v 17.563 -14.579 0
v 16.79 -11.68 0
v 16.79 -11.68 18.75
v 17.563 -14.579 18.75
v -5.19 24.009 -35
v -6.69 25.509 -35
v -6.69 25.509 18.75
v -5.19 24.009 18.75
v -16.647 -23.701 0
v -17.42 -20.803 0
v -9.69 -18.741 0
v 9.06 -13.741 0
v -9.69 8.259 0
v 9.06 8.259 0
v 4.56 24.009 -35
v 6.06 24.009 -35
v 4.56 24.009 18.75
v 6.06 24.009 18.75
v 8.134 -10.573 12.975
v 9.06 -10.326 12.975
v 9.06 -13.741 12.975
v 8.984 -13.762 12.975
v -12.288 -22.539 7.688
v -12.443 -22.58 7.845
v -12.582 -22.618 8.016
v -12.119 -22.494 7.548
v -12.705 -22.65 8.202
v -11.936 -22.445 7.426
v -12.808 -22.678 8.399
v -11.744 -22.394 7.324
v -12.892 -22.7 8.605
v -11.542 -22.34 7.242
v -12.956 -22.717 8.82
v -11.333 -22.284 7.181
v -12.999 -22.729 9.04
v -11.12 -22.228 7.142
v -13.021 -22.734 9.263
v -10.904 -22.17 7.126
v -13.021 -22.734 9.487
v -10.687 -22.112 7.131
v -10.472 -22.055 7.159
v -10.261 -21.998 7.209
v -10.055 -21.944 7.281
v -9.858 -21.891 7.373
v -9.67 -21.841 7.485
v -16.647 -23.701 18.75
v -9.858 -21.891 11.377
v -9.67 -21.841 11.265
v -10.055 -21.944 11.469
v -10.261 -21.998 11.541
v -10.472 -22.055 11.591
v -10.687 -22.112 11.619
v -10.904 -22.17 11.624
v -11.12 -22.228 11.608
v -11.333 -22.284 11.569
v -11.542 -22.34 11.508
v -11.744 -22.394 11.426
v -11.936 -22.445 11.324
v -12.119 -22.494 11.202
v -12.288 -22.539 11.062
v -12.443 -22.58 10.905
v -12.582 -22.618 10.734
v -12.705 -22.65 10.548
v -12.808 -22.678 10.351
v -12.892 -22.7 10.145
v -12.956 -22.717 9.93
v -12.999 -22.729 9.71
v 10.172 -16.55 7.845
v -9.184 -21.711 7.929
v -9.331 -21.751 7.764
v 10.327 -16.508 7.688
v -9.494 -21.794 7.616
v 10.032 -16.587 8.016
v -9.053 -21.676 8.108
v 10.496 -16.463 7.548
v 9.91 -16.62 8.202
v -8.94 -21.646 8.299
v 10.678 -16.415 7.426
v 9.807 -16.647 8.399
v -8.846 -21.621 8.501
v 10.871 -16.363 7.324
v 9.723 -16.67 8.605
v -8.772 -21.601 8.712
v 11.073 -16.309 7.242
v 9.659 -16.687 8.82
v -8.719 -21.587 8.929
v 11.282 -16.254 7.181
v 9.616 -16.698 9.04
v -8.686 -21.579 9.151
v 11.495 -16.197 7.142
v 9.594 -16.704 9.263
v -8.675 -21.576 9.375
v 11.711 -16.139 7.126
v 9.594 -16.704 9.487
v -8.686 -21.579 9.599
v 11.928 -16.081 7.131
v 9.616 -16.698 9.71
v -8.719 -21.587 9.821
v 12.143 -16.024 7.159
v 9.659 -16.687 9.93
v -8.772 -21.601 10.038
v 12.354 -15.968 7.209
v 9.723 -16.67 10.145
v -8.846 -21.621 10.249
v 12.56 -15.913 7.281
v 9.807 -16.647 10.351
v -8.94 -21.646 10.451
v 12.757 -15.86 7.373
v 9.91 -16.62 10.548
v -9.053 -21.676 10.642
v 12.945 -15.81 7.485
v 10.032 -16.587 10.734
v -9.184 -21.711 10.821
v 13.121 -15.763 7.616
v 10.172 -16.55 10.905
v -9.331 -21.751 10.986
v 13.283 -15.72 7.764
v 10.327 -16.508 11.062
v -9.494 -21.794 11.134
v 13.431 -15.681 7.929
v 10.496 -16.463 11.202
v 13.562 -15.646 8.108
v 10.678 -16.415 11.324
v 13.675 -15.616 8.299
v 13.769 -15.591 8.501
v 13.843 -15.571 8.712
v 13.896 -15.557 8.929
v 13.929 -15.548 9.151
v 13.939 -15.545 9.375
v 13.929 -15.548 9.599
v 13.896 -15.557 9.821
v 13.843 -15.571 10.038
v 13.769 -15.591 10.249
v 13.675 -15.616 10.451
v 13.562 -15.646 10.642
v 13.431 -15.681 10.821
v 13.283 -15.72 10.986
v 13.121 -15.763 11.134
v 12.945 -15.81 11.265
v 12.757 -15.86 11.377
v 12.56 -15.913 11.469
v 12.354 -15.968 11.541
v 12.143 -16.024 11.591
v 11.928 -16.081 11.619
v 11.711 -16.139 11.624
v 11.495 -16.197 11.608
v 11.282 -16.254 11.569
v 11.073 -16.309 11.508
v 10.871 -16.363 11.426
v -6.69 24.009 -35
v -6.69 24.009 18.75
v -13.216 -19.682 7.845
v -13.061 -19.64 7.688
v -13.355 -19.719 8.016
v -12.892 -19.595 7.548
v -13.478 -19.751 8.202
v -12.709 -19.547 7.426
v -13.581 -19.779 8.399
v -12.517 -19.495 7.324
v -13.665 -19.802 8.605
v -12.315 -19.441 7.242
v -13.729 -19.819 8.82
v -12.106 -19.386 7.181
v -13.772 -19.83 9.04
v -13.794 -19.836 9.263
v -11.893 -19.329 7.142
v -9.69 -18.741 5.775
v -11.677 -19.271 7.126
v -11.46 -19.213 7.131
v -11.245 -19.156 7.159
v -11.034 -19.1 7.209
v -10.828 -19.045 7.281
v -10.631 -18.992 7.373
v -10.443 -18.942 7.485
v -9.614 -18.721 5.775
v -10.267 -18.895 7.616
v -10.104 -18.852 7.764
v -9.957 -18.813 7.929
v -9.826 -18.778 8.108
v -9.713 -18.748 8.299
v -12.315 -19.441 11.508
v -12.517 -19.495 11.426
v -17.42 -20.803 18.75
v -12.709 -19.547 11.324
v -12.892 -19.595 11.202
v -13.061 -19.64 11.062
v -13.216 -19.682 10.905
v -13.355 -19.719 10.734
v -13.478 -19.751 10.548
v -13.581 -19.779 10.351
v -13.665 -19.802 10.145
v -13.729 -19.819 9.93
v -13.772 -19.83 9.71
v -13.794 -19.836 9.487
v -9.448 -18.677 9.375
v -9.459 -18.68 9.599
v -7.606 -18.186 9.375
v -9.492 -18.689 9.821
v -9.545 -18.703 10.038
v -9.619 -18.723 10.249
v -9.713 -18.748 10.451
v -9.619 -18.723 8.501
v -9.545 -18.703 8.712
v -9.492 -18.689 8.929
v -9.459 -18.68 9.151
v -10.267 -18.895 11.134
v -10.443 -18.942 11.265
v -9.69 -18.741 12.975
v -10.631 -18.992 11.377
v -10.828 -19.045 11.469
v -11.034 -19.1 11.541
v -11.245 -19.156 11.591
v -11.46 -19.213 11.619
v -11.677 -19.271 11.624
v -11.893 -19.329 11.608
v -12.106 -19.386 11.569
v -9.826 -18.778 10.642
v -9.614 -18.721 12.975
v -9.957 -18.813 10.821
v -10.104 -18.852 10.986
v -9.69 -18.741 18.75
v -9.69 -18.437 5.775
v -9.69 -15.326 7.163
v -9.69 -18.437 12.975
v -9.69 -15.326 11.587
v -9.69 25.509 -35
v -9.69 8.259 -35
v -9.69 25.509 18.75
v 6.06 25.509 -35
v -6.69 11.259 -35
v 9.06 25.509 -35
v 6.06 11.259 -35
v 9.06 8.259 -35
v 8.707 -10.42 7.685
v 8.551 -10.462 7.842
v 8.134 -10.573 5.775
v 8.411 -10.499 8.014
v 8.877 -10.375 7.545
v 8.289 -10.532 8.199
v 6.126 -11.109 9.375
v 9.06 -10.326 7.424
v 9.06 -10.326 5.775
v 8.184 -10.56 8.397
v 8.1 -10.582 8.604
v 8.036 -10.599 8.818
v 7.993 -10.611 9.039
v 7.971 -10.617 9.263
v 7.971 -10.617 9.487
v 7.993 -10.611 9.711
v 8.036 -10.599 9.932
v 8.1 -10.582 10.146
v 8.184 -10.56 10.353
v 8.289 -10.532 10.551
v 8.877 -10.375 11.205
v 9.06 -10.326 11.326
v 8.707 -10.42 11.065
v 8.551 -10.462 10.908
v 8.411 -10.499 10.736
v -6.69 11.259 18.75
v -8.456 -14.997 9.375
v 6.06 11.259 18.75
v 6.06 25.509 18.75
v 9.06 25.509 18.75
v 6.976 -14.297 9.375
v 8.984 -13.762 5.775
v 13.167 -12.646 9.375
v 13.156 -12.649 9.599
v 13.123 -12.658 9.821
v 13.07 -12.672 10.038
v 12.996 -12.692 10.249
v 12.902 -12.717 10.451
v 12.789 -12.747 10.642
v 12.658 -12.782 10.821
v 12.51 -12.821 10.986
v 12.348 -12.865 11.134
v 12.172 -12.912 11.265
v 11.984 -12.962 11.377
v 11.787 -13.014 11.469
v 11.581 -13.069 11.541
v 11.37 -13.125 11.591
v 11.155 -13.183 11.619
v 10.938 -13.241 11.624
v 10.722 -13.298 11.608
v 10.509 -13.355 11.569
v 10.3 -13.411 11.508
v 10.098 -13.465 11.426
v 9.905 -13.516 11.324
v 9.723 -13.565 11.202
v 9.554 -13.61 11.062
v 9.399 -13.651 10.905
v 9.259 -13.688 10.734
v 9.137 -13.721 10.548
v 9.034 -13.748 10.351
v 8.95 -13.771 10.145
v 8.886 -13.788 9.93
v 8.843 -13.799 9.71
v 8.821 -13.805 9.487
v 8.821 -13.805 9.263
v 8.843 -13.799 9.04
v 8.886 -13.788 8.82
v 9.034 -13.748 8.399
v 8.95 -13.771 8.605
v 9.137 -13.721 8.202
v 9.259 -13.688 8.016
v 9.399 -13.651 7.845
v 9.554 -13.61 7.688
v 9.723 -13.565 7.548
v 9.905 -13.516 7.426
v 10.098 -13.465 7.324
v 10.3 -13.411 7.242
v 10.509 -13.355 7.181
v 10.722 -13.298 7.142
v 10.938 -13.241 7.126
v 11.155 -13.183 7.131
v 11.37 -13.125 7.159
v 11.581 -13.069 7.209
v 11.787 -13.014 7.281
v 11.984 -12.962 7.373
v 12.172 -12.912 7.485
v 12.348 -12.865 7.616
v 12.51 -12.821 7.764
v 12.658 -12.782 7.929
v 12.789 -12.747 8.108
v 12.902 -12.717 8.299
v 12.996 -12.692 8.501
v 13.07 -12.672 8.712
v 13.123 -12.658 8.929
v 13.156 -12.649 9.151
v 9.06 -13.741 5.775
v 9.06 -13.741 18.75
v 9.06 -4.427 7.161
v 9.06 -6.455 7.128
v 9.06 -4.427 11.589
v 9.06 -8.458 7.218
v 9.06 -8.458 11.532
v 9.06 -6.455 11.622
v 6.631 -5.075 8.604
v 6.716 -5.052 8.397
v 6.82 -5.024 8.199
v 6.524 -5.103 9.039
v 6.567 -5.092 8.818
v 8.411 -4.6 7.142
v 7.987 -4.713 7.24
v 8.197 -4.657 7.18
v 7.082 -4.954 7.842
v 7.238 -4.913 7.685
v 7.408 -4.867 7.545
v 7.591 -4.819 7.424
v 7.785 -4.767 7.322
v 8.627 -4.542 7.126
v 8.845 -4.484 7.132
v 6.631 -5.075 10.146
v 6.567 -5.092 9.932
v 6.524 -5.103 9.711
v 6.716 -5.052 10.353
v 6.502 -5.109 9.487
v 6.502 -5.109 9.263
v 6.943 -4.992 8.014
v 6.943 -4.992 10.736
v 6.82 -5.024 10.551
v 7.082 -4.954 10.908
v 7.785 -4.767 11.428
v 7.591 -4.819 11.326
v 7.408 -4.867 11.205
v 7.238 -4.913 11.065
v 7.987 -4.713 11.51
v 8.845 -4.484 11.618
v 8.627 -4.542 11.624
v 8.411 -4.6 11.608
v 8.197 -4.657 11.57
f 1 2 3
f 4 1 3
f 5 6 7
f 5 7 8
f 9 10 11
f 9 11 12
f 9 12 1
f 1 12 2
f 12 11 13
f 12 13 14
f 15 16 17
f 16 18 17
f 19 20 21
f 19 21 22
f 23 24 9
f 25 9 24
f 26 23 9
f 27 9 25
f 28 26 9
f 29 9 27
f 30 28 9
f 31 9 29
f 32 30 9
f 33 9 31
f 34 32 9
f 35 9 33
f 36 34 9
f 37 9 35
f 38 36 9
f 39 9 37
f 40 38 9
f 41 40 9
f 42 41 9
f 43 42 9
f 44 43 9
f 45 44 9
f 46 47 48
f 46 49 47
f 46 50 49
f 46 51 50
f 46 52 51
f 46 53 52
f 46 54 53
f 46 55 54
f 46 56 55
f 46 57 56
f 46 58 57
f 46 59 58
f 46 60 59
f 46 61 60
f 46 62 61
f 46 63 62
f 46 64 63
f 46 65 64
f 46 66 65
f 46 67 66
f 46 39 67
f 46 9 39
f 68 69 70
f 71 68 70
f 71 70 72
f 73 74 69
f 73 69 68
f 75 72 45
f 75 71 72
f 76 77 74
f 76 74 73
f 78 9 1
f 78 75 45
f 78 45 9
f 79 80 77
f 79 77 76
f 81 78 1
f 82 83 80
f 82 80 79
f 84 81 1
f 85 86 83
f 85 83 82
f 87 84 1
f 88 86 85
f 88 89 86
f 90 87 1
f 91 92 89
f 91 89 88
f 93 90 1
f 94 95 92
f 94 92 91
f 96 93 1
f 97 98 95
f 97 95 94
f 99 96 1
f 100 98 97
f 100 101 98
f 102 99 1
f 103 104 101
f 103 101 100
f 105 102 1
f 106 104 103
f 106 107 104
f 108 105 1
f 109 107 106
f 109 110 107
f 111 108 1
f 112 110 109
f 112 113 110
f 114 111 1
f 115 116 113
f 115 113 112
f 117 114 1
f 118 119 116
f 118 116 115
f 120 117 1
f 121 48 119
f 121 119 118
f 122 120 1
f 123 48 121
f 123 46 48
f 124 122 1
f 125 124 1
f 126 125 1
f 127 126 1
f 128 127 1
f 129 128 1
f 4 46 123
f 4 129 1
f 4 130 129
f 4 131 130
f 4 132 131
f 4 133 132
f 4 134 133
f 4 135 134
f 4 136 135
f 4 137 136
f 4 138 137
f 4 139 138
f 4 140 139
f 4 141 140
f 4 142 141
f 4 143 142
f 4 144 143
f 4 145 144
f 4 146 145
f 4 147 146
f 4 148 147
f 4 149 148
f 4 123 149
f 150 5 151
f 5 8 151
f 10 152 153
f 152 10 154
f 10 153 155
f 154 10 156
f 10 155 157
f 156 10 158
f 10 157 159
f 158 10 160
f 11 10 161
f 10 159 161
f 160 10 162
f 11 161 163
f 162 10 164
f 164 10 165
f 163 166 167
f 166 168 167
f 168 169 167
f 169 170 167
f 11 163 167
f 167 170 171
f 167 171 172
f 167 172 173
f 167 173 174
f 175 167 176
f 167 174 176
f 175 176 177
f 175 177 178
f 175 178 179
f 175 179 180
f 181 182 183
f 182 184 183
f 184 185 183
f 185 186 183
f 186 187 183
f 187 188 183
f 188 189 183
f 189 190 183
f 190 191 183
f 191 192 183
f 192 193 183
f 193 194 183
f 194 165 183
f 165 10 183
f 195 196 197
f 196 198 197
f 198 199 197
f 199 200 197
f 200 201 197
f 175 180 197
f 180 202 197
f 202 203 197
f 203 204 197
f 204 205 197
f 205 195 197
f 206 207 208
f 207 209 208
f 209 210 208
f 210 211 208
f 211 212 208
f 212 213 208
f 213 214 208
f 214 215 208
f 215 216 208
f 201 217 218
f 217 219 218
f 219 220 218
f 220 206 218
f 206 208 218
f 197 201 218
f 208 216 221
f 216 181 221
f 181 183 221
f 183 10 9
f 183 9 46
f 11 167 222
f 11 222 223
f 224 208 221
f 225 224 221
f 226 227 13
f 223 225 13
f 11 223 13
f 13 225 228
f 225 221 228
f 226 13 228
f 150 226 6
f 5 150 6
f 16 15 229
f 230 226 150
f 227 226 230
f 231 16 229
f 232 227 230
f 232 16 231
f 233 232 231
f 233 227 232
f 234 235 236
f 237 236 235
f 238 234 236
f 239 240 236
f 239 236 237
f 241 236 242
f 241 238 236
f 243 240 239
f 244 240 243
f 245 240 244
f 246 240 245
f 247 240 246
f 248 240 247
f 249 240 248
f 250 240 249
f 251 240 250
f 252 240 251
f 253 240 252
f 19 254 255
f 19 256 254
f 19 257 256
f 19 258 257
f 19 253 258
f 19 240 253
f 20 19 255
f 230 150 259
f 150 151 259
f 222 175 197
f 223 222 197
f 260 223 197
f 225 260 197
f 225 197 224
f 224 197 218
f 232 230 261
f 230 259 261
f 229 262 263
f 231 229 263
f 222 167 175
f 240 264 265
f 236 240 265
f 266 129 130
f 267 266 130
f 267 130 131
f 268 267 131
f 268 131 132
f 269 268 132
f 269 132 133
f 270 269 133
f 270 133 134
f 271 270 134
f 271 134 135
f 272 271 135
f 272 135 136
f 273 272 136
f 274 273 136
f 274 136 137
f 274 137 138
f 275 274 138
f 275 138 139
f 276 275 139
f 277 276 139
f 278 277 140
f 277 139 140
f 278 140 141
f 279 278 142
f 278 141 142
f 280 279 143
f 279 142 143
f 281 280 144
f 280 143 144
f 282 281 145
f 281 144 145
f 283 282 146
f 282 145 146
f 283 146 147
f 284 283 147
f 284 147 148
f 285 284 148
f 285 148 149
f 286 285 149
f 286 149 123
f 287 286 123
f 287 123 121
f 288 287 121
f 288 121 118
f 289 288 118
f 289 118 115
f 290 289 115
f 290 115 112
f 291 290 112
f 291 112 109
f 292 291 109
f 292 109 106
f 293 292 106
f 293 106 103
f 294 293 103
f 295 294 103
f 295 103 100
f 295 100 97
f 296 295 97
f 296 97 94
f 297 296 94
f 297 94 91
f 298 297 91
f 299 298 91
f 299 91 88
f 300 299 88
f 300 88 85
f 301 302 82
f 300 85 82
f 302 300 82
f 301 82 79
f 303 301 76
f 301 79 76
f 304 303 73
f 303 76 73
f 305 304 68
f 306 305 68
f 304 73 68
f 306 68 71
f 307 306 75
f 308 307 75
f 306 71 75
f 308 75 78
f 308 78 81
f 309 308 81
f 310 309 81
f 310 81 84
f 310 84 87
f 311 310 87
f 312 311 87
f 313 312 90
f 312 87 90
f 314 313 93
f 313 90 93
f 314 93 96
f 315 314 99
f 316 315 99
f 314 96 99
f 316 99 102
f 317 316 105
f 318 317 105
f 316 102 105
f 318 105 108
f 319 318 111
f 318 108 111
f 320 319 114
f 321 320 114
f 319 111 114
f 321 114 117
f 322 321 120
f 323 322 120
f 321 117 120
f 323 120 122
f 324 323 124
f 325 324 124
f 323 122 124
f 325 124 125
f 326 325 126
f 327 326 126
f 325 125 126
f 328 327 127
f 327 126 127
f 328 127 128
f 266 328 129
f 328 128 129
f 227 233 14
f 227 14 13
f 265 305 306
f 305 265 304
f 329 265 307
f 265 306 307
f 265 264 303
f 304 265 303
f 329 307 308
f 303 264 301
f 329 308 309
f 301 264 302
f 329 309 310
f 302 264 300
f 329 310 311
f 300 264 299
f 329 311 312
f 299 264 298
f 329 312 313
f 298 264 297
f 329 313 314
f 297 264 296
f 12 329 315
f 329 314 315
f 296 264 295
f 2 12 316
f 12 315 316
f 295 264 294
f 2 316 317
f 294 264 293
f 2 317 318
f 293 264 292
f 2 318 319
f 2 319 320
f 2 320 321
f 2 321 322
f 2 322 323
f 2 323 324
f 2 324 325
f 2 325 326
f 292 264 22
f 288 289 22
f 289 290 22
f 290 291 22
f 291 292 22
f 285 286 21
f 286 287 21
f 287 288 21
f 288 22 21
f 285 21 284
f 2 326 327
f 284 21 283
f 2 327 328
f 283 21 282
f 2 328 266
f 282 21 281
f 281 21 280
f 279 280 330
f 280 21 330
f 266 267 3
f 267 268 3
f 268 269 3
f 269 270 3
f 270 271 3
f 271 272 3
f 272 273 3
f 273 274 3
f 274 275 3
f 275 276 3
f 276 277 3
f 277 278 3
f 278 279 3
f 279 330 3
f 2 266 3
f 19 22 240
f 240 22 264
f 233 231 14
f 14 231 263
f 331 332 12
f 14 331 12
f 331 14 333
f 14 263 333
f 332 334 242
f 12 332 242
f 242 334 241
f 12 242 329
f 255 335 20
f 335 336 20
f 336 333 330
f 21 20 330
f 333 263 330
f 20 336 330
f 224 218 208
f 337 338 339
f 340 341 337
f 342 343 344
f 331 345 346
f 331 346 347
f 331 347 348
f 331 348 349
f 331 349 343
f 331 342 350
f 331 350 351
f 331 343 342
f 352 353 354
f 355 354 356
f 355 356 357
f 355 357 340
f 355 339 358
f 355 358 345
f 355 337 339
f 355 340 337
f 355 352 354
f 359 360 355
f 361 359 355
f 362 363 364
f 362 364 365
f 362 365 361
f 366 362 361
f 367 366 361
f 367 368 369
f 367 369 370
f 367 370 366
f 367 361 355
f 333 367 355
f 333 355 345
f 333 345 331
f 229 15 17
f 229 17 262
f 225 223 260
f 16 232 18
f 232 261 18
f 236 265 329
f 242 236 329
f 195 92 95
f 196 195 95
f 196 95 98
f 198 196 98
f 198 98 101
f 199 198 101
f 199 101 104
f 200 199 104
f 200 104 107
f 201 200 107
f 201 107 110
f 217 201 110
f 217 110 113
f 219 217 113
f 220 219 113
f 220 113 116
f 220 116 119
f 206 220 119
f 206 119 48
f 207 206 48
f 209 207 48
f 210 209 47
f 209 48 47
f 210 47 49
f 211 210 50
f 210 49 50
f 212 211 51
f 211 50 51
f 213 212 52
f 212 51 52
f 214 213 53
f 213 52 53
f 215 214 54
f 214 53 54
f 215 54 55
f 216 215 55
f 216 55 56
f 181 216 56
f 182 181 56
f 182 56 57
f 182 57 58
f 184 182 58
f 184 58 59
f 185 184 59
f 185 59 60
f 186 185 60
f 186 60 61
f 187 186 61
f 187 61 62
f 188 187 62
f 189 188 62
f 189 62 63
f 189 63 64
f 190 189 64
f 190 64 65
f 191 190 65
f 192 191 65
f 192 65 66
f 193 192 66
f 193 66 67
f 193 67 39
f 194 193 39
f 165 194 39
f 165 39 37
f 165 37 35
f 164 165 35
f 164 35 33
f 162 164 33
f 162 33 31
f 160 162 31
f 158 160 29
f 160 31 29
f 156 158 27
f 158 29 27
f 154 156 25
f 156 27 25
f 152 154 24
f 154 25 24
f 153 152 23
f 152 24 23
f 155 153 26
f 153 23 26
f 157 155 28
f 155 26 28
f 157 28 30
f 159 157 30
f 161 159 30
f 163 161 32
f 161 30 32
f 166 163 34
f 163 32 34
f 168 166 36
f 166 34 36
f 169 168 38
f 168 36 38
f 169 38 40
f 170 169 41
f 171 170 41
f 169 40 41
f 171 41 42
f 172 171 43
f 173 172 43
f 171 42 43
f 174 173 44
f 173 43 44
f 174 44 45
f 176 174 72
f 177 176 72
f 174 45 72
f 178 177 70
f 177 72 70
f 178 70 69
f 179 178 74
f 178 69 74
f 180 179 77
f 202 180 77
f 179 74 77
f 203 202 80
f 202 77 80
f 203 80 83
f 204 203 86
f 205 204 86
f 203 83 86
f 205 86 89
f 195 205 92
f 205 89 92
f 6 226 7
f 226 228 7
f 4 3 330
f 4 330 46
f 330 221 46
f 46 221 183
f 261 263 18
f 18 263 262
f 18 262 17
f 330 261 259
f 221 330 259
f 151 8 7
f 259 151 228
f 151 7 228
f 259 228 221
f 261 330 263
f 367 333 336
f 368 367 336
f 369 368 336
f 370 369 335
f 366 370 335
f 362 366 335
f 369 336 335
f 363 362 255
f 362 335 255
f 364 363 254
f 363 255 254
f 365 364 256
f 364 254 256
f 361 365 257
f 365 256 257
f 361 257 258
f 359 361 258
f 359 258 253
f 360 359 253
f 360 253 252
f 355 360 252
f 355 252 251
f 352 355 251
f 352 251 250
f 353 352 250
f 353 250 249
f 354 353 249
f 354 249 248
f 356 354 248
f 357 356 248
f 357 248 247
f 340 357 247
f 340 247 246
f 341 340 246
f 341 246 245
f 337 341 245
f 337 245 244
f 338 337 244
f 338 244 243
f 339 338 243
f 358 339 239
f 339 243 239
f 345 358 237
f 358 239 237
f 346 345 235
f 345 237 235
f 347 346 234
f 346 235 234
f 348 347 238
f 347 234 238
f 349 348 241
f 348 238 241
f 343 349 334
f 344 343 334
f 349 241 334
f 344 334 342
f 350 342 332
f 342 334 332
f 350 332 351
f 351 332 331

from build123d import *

# Parameters (mm, degrees)
F3_DEPTH  = 18.75
F4_W      = 19.4052183703
F4_H      = 18.75
F4_W_2    = 8
F5_DEPTH  = 3
F6_R      = 2.25
F7_DEPTH  = 12
F9_DEPTH  = 3.3
F11_DEPTH = 35


with BuildPart() as f3:
    # F2 (on Top) → F3 (new body)
    with BuildSketch(Plane.XY):
        Polygon((-6.6899931507, 11.2585633857), (-6.6899931507, 24.0085633857), (-5.1899931507, 24.0085633857), (-6.6899931507, 25.5085633857), (-9.6899931507, 25.5085633857), (-9.6899931507, 24.0085633857), (-9.6899931507, 11.2585633857), (-9.6899931507, -18.7414366143), (9.0600068493, -13.7414366143), (9.0600068493, 11.2585633857), (9.0600068493, 24.0085633857), (9.0600068493, 25.5085633857), (6.0600068493, 25.5085633857), (4.5600068493, 24.0085633857), (6.0600068493, 24.0085633857), (6.0600068493, 11.2585633857), align=None)
    extrude(amount=F3_DEPTH)

    # F4 (on face) → F5 (join)
    with BuildSketch(Plane(origin=(4.0225987819, -15.0847454323, 0), x_dir=(0.9662349396, 0.2576626506, 0), z_dir=(0.2576626506, -0.9662349396, 0))):
        with Locations((-4.4891689949, 9.375)):
            Rectangle(F4_W, F4_H)
        with Locations((-18.1917781801, 9.375)):
            Rectangle(F4_W_2, F4_H)
        with Locations((9.2134401902, 9.375)):
            Rectangle(F4_W_2, F4_H)
    extrude(amount=F5_DEPTH)

    # F6 (on face) → F7 (cut)
    with BuildSketch(Plane(origin=(4.7955867336, -17.9834502511, 0), x_dir=(0.9662349396, 0.2576626506, 0), z_dir=(0.2576626506, -0.9662349396, 0))):
        with Locations((7.2134401902, 9.375)):
            Circle(F6_R)
        with Locations((-16.1917781801, 9.375)):
            Circle(F6_R)
    extrude(amount=-F7_DEPTH, mode=Mode.SUBTRACT)

    # F8 (on face) → F9 (cut)
    with BuildSketch(Plane(origin=(4.0225987819, -15.0847454323, 0), x_dir=(0.9662349396, 0.2576626506, 0), z_dir=(0.2576626506, -0.9662349396, 0))):
        Polygon((5.2134401902, 5.775), (9.2919011593, 5.775), (11.3703621284, 9.375), (9.2919011593, 12.975), (5.2134401902, 12.975), align=None)
        Polygon((5.1349792211, 5.775), (5.2134401902, 5.775), (5.2134401902, 12.975), (5.1349792211, 12.975), (3.0565182521, 9.375), align=None)
        Polygon((-18.2702391492, 5.775), (-14.1917781801, 5.775), (-14.1917781801, 12.975), (-18.2702391492, 12.975), (-20.3487001183, 9.375), align=None)
        Polygon((-14.1917781801, 12.975), (-14.1917781801, 5.775), (-14.113317211, 5.775), (-12.0348562419, 9.375), (-14.113317211, 12.975), align=None)
    extrude(amount=-F9_DEPTH, mode=Mode.SUBTRACT)

    # F10 (on face) → F11 (join)
    with BuildSketch(Plane(origin=(0, 0, 0), x_dir=(1, 0, 0), z_dir=(0, 0, -1))):
        Polygon((9.0600068493, -8.2585633857), (-9.6899931507, -8.2585633857), (-9.6899931507, -25.5085633857), (-6.6899931507, -25.5085633857), (-5.1899931507, -24.0085633857), (-6.6899931507, -24.0085633857), (-6.6899931507, -11.2585633857), (6.0600068493, -11.2585633857), (6.0600068493, -24.0085633857), (4.5600068493, -24.0085633857), (6.0600068493, -25.5085633857), (9.0600068493, -25.5085633857), align=None)
    extrude(amount=F11_DEPTH)


solid = f3.part
